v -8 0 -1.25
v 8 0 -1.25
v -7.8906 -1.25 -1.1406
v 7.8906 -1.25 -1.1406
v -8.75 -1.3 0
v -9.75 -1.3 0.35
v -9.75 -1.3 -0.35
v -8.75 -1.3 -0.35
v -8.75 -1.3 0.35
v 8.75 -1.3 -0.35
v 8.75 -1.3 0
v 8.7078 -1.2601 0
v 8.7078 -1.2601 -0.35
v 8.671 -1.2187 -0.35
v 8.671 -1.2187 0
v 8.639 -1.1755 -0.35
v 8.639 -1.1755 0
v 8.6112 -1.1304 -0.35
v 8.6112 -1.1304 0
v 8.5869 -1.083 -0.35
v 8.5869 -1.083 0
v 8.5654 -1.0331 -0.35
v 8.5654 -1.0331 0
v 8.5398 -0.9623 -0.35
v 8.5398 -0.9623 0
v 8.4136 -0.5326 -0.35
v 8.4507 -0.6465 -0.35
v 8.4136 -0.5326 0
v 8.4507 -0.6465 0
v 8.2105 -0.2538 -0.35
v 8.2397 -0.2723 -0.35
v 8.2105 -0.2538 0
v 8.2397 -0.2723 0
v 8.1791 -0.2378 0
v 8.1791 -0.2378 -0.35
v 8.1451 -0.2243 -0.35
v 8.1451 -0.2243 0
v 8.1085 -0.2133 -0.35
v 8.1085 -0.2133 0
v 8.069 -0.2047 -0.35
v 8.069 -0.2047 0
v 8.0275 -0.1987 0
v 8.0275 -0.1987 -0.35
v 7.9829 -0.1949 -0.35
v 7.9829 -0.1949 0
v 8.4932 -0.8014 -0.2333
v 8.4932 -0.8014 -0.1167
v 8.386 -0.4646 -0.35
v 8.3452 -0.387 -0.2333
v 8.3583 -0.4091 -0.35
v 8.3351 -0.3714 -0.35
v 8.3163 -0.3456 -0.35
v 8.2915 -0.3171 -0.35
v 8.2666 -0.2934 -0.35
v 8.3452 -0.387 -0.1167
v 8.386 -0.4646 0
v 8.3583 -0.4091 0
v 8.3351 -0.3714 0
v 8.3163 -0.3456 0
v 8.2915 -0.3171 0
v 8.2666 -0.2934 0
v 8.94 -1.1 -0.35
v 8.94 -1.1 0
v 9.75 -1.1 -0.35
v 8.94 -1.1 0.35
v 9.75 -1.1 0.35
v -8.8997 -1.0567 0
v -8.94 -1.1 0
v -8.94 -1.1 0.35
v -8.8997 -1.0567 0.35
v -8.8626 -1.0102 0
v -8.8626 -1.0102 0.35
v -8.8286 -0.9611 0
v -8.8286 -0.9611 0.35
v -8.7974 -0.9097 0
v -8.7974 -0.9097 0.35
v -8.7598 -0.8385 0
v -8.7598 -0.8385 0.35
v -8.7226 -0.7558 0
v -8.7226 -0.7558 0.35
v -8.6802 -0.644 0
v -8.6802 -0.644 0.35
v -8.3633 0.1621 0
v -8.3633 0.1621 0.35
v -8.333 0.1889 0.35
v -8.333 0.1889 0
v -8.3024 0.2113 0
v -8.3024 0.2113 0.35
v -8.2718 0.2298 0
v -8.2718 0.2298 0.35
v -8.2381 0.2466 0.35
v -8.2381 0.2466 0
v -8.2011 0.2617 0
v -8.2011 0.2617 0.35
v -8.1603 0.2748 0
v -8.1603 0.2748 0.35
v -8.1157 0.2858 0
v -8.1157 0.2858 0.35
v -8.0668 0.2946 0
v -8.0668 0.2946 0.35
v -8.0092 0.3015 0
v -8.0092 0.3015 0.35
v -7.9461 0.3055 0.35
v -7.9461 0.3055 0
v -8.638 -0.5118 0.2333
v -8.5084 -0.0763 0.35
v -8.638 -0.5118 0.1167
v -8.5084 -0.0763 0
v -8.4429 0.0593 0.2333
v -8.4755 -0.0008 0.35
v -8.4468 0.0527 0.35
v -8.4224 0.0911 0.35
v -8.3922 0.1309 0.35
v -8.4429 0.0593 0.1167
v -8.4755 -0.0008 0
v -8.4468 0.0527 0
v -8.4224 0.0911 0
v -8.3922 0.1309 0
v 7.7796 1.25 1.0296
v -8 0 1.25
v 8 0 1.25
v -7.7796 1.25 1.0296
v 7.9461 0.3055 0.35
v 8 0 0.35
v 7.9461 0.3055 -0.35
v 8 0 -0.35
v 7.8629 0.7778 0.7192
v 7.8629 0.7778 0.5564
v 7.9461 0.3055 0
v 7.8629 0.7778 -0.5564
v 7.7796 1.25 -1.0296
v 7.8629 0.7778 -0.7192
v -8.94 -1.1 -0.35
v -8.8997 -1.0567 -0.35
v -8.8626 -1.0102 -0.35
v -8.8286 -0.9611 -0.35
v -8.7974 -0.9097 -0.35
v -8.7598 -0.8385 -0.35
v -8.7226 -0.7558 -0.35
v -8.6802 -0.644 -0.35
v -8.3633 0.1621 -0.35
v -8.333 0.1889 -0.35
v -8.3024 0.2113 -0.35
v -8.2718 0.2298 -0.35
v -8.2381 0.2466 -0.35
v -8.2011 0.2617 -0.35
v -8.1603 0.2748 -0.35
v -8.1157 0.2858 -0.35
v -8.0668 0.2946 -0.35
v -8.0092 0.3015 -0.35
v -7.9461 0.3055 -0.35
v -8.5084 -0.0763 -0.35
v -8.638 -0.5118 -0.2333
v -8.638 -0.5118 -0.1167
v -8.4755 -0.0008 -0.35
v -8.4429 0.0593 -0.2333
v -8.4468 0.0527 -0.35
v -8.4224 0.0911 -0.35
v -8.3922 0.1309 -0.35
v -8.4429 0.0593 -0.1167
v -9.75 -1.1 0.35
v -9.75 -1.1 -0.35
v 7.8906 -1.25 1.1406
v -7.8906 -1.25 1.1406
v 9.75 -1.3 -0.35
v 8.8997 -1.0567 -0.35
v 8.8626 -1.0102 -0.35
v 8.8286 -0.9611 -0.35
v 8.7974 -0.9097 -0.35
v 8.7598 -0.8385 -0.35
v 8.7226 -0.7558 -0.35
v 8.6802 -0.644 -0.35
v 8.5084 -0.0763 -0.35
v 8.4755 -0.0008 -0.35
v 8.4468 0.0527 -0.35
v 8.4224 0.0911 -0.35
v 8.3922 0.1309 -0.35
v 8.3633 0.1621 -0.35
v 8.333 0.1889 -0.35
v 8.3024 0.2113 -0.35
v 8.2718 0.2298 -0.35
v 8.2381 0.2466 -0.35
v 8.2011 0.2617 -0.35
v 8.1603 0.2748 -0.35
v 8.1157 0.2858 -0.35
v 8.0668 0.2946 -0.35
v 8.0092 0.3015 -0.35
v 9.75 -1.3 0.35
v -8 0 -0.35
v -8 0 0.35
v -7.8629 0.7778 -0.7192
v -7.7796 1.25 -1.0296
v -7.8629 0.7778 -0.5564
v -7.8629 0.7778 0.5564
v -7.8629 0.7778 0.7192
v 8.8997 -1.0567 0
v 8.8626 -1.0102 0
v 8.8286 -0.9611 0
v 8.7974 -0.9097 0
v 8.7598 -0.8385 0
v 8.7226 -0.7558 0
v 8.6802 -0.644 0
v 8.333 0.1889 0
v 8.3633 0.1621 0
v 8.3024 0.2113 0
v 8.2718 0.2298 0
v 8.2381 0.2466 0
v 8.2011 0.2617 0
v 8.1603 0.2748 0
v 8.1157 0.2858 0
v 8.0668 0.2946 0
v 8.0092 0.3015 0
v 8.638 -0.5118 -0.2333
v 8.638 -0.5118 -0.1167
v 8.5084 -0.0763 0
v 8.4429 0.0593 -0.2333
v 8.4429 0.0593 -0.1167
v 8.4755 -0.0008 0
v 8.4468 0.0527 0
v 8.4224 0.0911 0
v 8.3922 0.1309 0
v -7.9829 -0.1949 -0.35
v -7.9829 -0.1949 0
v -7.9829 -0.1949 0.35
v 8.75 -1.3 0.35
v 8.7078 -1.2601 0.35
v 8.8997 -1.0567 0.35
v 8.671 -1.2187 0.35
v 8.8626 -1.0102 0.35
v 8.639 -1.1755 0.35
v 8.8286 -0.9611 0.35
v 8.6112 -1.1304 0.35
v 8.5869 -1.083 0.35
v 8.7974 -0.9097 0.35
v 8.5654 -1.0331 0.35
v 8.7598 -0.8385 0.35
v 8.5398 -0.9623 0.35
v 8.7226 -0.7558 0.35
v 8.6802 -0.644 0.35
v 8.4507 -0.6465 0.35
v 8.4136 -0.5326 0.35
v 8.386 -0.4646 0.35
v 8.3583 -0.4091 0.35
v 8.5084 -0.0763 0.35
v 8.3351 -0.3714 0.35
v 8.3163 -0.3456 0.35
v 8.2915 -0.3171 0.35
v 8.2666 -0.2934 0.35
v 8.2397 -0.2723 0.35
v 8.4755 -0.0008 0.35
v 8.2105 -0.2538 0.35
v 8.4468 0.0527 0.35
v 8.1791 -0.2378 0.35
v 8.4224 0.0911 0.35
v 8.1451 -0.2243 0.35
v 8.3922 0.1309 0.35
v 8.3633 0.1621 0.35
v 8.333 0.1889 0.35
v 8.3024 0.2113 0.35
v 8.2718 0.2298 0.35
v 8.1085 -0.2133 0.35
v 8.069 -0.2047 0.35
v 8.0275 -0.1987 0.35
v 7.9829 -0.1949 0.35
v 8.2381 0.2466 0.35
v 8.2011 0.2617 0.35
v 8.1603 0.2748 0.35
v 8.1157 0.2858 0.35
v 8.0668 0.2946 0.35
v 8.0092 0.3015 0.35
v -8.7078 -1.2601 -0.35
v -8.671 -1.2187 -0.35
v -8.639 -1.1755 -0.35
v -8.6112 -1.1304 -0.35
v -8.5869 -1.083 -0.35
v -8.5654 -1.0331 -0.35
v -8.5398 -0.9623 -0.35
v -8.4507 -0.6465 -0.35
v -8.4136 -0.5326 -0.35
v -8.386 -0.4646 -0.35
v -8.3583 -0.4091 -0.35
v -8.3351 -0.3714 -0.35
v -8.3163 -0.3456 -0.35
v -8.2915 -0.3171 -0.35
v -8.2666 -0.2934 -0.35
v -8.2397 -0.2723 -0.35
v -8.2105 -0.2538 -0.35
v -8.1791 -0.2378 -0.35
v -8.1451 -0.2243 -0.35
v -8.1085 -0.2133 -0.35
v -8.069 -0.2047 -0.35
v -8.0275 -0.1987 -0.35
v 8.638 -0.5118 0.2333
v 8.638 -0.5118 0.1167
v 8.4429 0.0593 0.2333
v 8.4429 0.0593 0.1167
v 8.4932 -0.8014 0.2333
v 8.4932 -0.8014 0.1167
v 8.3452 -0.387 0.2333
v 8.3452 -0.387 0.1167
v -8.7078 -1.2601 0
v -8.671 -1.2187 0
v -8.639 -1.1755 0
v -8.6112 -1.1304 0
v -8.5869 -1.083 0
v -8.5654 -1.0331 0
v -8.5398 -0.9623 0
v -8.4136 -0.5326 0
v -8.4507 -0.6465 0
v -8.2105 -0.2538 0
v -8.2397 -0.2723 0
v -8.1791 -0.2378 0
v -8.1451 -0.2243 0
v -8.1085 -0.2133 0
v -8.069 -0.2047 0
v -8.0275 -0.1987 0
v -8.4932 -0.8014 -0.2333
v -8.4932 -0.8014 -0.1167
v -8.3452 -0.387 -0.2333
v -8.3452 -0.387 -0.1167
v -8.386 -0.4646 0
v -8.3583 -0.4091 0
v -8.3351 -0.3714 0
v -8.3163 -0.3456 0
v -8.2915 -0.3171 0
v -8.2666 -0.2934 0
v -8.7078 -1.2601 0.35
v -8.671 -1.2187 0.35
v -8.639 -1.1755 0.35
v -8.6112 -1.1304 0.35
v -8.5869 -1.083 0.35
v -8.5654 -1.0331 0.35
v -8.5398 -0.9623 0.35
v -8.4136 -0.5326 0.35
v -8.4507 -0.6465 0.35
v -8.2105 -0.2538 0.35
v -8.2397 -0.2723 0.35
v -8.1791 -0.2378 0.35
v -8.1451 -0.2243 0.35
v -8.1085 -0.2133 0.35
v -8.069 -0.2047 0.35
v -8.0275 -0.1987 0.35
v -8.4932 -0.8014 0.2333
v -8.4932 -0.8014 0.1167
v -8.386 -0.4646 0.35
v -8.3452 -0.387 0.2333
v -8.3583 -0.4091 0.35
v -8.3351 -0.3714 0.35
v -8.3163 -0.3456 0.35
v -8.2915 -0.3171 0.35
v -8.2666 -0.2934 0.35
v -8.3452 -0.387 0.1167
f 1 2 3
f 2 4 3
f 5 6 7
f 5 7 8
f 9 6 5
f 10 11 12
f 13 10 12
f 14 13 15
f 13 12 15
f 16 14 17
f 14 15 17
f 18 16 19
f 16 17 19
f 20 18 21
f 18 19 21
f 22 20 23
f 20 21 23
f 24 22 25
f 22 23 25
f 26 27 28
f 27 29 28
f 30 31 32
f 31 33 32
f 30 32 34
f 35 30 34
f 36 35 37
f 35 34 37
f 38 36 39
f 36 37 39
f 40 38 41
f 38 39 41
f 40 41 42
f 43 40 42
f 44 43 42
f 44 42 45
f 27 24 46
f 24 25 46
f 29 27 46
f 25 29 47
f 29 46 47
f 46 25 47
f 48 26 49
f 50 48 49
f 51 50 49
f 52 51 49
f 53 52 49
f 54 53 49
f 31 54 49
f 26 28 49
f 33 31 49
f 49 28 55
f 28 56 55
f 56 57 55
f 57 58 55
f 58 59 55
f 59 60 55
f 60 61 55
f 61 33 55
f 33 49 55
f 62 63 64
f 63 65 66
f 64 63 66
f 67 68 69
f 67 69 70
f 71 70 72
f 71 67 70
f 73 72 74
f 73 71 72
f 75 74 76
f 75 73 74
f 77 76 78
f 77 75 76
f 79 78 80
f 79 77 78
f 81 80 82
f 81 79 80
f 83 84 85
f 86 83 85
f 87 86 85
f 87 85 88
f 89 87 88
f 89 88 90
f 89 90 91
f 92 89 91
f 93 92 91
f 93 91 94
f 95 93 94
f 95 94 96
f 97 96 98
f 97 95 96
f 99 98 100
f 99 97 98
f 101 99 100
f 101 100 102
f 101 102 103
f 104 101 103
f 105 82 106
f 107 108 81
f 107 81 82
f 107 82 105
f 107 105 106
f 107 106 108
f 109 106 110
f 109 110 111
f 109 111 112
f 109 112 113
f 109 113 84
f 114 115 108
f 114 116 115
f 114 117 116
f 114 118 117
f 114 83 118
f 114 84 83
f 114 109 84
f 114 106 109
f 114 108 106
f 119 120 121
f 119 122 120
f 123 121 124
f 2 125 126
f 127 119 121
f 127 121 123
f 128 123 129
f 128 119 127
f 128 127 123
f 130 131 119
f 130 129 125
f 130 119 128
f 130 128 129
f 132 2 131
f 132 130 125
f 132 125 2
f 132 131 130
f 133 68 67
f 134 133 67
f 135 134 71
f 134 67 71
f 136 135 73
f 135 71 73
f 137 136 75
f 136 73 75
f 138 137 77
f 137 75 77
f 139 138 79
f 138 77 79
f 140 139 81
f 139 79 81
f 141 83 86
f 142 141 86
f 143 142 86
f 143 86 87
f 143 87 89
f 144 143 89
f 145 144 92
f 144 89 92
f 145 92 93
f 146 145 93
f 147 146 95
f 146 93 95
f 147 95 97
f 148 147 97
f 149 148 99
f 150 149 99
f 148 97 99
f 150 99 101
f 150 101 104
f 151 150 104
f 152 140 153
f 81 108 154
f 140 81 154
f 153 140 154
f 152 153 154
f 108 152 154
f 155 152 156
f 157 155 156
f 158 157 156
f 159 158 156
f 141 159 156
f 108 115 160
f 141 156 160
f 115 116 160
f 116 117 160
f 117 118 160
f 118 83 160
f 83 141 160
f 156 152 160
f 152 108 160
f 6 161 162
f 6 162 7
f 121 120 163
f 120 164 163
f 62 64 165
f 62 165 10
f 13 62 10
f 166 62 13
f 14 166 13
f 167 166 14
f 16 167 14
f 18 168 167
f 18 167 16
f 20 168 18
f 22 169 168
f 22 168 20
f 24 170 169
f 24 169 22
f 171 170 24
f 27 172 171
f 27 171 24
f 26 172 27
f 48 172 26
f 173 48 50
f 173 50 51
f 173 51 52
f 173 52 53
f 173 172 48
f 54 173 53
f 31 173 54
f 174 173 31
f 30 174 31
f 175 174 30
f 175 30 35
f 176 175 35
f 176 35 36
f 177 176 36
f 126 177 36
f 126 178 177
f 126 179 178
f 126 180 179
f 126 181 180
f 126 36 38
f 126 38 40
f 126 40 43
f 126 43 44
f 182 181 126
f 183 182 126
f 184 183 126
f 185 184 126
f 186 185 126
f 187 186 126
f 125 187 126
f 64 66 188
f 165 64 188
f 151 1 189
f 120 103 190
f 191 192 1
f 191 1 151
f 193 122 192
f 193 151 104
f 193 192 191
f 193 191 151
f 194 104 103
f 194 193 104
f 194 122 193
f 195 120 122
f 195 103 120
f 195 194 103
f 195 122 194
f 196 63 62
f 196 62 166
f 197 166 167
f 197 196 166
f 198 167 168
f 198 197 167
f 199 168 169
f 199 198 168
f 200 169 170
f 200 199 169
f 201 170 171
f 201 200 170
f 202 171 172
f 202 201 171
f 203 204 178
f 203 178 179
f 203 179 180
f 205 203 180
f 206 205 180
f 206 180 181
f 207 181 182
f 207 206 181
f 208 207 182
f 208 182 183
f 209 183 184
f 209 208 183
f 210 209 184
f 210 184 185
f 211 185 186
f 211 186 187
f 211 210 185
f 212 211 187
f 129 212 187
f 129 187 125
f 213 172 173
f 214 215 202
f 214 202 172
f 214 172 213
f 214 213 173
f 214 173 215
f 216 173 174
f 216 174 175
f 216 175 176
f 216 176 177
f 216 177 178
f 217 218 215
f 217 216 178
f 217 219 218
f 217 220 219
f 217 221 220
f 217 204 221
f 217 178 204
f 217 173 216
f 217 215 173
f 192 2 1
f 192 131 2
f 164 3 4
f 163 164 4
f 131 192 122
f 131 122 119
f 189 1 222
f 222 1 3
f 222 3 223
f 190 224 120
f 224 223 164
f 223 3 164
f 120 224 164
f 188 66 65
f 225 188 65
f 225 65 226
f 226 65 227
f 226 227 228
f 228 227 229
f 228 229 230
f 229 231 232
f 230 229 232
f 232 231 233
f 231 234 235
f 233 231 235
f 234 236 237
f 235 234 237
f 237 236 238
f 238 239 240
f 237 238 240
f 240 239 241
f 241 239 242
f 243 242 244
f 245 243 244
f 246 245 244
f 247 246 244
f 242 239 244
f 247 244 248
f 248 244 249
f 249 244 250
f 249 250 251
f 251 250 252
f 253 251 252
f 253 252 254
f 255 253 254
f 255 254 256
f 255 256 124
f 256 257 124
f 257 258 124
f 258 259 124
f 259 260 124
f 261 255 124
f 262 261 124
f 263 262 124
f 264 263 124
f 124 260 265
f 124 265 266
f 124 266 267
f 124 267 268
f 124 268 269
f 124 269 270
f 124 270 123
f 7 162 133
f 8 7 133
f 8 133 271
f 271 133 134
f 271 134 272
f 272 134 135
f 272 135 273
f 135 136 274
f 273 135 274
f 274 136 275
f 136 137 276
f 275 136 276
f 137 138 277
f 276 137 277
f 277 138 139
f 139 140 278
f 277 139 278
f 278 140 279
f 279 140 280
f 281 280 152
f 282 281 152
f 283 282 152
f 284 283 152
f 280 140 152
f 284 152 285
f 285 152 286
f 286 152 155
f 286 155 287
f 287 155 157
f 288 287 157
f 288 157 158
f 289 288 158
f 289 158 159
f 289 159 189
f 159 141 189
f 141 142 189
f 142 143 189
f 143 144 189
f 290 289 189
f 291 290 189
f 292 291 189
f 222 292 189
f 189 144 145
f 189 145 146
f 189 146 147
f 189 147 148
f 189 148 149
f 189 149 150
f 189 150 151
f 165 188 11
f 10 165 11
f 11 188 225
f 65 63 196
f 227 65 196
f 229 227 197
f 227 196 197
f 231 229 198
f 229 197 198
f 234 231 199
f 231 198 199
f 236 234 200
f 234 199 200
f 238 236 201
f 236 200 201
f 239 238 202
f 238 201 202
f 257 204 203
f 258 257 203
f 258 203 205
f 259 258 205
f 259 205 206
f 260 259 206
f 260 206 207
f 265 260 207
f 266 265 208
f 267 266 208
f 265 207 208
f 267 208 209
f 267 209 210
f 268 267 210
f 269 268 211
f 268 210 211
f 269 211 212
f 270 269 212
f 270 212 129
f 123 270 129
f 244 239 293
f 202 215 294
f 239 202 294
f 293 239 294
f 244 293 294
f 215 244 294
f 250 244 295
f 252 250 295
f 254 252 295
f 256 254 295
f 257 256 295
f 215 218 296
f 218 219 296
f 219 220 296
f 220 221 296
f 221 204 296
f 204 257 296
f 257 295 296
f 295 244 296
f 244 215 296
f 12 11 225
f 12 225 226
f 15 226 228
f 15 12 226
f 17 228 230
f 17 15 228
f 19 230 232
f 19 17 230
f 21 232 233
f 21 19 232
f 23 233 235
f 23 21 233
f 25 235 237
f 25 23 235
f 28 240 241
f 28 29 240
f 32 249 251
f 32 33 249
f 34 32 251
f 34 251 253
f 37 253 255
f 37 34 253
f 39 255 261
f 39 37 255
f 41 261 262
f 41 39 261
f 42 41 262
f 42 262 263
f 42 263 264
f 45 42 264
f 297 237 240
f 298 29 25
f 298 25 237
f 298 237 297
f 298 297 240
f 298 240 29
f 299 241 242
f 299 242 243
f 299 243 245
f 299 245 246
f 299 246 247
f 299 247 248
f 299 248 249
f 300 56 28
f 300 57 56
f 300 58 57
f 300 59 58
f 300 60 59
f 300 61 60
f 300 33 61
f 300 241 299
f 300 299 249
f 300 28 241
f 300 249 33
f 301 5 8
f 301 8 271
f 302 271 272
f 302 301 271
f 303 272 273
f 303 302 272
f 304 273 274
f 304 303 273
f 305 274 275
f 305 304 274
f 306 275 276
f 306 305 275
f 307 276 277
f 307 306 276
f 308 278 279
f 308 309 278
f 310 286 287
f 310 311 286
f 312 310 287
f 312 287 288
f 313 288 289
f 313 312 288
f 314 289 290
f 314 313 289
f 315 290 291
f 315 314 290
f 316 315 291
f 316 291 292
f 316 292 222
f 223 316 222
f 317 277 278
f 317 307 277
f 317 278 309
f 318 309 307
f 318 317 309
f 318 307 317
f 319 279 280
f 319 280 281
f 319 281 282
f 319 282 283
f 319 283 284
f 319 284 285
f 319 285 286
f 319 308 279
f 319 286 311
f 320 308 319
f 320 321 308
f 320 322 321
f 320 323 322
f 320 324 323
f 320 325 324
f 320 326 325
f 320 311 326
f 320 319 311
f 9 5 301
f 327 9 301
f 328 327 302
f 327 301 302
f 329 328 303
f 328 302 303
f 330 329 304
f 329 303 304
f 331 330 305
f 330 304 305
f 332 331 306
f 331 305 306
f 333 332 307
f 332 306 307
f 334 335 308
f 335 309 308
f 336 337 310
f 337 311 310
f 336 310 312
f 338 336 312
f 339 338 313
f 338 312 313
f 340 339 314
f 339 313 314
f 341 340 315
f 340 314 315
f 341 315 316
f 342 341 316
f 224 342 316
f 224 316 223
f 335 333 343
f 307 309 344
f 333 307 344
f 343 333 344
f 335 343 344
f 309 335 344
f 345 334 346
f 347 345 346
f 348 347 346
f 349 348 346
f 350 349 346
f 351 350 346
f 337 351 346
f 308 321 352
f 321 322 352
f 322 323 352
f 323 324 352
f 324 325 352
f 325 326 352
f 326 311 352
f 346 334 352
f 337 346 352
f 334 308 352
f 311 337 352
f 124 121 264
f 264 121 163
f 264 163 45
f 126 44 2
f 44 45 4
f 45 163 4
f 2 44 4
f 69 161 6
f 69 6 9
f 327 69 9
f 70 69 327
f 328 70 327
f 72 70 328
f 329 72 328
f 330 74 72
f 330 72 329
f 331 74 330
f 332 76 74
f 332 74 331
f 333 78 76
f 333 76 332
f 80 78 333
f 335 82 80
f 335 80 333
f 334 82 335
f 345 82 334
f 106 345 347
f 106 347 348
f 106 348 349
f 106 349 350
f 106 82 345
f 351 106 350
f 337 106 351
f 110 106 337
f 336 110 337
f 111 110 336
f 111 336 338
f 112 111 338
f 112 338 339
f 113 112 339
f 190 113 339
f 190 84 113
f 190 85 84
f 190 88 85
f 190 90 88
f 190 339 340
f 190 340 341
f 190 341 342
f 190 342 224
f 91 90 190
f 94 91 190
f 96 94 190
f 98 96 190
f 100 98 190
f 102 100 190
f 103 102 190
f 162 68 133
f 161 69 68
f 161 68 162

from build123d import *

# Parameters (mm, degrees)
SKETCH_2_W                = 16
SKETCH_2_H                = 2.5
EXTRUDE_1_DEPTH           = 1.25
EXTRUDE_1_TAPER           = 10
EXTRUDE_1_OTHER_WAY_DEPTH = 1.25
EXTRUDE_1_OTHER_WAY_TAPER = 5
EXTRUDE_2_DEPTH           = 0.35


with BuildPart() as part:
    # Эскиз2 → Бобышка-Вытянуть1 (new body)
    with BuildSketch(Plane(origin=(0, 0, 0), x_dir=(1, 0, 0), z_dir=(0, 1, 0))):
        Rectangle(SKETCH_2_W, SKETCH_2_H)
    extrude(amount=EXTRUDE_1_DEPTH, taper=EXTRUDE_1_TAPER)

    # Эскиз2 → Бобышка-Вытянуть1 other way (add)
    with BuildSketch(Plane(origin=(0, 0, 0), x_dir=(1, 0, 0), z_dir=(0, 1, 0))):
        Rectangle(SKETCH_2_W, SKETCH_2_H)
    extrude(amount=-EXTRUDE_1_OTHER_WAY_DEPTH, taper=EXTRUDE_1_OTHER_WAY_TAPER)

    # Эскиз3 → Бобышка-Вытянуть2 (add, symmetric)
    with BuildSketch(Plane.XY):
        with BuildLine():
            Line((-8.94, -1.1), (-9.75, -1.1))
            Line((-9.75, -1.1), (-9.75, -1.3))
            Line((-9.75, -1.3), (-8.75, -1.3))
            add(Edge.make_bspline(
                [(-8.75, -1.3), (-8.598827161, -1.168647342), (-8.520234343, -0.919812082), (-8.367054145, -0.306395683), (-8.139808897, -0.193393407), (-7.92698735, -0.193393407)],
                knots=[0, 0, 0, 0, 0.417832957, 0.685176508, 1, 1, 1, 1], degree=3))
            Line((-7.92698735, -0.193393407), (-7.373029008, -0.193393407))
            Line((-7.373029008, -0.193393407), (-7.373029008, 0.306606593))
            Line((-7.373029008, 0.306606593), (-7.889795637, 0.306606593))
            add(Edge.make_bspline(
                [(-8.94, -1.1), (-8.782709202, -0.94416904), (-8.601427611, -0.451853298), (-8.504762441, 0.074209929), (-8.230463242, 0.306606593), (-7.889795637, 0.306606593)],
                knots=[0, 0, 0, 0, 0.318526042, 0.678515107, 1, 1, 1, 1], degree=3))
        make_face()
    extrude_2 = extrude(amount=EXTRUDE_2_DEPTH, both=True)

    # Зеркальное отражение1: Бобышка-Вытянуть2 across plane
    add(extrude_2.mirror(Plane(origin=(0, 0, 0), x_dir=(0, 0, 1), z_dir=(1, 0, 0))))


solid = part.part
